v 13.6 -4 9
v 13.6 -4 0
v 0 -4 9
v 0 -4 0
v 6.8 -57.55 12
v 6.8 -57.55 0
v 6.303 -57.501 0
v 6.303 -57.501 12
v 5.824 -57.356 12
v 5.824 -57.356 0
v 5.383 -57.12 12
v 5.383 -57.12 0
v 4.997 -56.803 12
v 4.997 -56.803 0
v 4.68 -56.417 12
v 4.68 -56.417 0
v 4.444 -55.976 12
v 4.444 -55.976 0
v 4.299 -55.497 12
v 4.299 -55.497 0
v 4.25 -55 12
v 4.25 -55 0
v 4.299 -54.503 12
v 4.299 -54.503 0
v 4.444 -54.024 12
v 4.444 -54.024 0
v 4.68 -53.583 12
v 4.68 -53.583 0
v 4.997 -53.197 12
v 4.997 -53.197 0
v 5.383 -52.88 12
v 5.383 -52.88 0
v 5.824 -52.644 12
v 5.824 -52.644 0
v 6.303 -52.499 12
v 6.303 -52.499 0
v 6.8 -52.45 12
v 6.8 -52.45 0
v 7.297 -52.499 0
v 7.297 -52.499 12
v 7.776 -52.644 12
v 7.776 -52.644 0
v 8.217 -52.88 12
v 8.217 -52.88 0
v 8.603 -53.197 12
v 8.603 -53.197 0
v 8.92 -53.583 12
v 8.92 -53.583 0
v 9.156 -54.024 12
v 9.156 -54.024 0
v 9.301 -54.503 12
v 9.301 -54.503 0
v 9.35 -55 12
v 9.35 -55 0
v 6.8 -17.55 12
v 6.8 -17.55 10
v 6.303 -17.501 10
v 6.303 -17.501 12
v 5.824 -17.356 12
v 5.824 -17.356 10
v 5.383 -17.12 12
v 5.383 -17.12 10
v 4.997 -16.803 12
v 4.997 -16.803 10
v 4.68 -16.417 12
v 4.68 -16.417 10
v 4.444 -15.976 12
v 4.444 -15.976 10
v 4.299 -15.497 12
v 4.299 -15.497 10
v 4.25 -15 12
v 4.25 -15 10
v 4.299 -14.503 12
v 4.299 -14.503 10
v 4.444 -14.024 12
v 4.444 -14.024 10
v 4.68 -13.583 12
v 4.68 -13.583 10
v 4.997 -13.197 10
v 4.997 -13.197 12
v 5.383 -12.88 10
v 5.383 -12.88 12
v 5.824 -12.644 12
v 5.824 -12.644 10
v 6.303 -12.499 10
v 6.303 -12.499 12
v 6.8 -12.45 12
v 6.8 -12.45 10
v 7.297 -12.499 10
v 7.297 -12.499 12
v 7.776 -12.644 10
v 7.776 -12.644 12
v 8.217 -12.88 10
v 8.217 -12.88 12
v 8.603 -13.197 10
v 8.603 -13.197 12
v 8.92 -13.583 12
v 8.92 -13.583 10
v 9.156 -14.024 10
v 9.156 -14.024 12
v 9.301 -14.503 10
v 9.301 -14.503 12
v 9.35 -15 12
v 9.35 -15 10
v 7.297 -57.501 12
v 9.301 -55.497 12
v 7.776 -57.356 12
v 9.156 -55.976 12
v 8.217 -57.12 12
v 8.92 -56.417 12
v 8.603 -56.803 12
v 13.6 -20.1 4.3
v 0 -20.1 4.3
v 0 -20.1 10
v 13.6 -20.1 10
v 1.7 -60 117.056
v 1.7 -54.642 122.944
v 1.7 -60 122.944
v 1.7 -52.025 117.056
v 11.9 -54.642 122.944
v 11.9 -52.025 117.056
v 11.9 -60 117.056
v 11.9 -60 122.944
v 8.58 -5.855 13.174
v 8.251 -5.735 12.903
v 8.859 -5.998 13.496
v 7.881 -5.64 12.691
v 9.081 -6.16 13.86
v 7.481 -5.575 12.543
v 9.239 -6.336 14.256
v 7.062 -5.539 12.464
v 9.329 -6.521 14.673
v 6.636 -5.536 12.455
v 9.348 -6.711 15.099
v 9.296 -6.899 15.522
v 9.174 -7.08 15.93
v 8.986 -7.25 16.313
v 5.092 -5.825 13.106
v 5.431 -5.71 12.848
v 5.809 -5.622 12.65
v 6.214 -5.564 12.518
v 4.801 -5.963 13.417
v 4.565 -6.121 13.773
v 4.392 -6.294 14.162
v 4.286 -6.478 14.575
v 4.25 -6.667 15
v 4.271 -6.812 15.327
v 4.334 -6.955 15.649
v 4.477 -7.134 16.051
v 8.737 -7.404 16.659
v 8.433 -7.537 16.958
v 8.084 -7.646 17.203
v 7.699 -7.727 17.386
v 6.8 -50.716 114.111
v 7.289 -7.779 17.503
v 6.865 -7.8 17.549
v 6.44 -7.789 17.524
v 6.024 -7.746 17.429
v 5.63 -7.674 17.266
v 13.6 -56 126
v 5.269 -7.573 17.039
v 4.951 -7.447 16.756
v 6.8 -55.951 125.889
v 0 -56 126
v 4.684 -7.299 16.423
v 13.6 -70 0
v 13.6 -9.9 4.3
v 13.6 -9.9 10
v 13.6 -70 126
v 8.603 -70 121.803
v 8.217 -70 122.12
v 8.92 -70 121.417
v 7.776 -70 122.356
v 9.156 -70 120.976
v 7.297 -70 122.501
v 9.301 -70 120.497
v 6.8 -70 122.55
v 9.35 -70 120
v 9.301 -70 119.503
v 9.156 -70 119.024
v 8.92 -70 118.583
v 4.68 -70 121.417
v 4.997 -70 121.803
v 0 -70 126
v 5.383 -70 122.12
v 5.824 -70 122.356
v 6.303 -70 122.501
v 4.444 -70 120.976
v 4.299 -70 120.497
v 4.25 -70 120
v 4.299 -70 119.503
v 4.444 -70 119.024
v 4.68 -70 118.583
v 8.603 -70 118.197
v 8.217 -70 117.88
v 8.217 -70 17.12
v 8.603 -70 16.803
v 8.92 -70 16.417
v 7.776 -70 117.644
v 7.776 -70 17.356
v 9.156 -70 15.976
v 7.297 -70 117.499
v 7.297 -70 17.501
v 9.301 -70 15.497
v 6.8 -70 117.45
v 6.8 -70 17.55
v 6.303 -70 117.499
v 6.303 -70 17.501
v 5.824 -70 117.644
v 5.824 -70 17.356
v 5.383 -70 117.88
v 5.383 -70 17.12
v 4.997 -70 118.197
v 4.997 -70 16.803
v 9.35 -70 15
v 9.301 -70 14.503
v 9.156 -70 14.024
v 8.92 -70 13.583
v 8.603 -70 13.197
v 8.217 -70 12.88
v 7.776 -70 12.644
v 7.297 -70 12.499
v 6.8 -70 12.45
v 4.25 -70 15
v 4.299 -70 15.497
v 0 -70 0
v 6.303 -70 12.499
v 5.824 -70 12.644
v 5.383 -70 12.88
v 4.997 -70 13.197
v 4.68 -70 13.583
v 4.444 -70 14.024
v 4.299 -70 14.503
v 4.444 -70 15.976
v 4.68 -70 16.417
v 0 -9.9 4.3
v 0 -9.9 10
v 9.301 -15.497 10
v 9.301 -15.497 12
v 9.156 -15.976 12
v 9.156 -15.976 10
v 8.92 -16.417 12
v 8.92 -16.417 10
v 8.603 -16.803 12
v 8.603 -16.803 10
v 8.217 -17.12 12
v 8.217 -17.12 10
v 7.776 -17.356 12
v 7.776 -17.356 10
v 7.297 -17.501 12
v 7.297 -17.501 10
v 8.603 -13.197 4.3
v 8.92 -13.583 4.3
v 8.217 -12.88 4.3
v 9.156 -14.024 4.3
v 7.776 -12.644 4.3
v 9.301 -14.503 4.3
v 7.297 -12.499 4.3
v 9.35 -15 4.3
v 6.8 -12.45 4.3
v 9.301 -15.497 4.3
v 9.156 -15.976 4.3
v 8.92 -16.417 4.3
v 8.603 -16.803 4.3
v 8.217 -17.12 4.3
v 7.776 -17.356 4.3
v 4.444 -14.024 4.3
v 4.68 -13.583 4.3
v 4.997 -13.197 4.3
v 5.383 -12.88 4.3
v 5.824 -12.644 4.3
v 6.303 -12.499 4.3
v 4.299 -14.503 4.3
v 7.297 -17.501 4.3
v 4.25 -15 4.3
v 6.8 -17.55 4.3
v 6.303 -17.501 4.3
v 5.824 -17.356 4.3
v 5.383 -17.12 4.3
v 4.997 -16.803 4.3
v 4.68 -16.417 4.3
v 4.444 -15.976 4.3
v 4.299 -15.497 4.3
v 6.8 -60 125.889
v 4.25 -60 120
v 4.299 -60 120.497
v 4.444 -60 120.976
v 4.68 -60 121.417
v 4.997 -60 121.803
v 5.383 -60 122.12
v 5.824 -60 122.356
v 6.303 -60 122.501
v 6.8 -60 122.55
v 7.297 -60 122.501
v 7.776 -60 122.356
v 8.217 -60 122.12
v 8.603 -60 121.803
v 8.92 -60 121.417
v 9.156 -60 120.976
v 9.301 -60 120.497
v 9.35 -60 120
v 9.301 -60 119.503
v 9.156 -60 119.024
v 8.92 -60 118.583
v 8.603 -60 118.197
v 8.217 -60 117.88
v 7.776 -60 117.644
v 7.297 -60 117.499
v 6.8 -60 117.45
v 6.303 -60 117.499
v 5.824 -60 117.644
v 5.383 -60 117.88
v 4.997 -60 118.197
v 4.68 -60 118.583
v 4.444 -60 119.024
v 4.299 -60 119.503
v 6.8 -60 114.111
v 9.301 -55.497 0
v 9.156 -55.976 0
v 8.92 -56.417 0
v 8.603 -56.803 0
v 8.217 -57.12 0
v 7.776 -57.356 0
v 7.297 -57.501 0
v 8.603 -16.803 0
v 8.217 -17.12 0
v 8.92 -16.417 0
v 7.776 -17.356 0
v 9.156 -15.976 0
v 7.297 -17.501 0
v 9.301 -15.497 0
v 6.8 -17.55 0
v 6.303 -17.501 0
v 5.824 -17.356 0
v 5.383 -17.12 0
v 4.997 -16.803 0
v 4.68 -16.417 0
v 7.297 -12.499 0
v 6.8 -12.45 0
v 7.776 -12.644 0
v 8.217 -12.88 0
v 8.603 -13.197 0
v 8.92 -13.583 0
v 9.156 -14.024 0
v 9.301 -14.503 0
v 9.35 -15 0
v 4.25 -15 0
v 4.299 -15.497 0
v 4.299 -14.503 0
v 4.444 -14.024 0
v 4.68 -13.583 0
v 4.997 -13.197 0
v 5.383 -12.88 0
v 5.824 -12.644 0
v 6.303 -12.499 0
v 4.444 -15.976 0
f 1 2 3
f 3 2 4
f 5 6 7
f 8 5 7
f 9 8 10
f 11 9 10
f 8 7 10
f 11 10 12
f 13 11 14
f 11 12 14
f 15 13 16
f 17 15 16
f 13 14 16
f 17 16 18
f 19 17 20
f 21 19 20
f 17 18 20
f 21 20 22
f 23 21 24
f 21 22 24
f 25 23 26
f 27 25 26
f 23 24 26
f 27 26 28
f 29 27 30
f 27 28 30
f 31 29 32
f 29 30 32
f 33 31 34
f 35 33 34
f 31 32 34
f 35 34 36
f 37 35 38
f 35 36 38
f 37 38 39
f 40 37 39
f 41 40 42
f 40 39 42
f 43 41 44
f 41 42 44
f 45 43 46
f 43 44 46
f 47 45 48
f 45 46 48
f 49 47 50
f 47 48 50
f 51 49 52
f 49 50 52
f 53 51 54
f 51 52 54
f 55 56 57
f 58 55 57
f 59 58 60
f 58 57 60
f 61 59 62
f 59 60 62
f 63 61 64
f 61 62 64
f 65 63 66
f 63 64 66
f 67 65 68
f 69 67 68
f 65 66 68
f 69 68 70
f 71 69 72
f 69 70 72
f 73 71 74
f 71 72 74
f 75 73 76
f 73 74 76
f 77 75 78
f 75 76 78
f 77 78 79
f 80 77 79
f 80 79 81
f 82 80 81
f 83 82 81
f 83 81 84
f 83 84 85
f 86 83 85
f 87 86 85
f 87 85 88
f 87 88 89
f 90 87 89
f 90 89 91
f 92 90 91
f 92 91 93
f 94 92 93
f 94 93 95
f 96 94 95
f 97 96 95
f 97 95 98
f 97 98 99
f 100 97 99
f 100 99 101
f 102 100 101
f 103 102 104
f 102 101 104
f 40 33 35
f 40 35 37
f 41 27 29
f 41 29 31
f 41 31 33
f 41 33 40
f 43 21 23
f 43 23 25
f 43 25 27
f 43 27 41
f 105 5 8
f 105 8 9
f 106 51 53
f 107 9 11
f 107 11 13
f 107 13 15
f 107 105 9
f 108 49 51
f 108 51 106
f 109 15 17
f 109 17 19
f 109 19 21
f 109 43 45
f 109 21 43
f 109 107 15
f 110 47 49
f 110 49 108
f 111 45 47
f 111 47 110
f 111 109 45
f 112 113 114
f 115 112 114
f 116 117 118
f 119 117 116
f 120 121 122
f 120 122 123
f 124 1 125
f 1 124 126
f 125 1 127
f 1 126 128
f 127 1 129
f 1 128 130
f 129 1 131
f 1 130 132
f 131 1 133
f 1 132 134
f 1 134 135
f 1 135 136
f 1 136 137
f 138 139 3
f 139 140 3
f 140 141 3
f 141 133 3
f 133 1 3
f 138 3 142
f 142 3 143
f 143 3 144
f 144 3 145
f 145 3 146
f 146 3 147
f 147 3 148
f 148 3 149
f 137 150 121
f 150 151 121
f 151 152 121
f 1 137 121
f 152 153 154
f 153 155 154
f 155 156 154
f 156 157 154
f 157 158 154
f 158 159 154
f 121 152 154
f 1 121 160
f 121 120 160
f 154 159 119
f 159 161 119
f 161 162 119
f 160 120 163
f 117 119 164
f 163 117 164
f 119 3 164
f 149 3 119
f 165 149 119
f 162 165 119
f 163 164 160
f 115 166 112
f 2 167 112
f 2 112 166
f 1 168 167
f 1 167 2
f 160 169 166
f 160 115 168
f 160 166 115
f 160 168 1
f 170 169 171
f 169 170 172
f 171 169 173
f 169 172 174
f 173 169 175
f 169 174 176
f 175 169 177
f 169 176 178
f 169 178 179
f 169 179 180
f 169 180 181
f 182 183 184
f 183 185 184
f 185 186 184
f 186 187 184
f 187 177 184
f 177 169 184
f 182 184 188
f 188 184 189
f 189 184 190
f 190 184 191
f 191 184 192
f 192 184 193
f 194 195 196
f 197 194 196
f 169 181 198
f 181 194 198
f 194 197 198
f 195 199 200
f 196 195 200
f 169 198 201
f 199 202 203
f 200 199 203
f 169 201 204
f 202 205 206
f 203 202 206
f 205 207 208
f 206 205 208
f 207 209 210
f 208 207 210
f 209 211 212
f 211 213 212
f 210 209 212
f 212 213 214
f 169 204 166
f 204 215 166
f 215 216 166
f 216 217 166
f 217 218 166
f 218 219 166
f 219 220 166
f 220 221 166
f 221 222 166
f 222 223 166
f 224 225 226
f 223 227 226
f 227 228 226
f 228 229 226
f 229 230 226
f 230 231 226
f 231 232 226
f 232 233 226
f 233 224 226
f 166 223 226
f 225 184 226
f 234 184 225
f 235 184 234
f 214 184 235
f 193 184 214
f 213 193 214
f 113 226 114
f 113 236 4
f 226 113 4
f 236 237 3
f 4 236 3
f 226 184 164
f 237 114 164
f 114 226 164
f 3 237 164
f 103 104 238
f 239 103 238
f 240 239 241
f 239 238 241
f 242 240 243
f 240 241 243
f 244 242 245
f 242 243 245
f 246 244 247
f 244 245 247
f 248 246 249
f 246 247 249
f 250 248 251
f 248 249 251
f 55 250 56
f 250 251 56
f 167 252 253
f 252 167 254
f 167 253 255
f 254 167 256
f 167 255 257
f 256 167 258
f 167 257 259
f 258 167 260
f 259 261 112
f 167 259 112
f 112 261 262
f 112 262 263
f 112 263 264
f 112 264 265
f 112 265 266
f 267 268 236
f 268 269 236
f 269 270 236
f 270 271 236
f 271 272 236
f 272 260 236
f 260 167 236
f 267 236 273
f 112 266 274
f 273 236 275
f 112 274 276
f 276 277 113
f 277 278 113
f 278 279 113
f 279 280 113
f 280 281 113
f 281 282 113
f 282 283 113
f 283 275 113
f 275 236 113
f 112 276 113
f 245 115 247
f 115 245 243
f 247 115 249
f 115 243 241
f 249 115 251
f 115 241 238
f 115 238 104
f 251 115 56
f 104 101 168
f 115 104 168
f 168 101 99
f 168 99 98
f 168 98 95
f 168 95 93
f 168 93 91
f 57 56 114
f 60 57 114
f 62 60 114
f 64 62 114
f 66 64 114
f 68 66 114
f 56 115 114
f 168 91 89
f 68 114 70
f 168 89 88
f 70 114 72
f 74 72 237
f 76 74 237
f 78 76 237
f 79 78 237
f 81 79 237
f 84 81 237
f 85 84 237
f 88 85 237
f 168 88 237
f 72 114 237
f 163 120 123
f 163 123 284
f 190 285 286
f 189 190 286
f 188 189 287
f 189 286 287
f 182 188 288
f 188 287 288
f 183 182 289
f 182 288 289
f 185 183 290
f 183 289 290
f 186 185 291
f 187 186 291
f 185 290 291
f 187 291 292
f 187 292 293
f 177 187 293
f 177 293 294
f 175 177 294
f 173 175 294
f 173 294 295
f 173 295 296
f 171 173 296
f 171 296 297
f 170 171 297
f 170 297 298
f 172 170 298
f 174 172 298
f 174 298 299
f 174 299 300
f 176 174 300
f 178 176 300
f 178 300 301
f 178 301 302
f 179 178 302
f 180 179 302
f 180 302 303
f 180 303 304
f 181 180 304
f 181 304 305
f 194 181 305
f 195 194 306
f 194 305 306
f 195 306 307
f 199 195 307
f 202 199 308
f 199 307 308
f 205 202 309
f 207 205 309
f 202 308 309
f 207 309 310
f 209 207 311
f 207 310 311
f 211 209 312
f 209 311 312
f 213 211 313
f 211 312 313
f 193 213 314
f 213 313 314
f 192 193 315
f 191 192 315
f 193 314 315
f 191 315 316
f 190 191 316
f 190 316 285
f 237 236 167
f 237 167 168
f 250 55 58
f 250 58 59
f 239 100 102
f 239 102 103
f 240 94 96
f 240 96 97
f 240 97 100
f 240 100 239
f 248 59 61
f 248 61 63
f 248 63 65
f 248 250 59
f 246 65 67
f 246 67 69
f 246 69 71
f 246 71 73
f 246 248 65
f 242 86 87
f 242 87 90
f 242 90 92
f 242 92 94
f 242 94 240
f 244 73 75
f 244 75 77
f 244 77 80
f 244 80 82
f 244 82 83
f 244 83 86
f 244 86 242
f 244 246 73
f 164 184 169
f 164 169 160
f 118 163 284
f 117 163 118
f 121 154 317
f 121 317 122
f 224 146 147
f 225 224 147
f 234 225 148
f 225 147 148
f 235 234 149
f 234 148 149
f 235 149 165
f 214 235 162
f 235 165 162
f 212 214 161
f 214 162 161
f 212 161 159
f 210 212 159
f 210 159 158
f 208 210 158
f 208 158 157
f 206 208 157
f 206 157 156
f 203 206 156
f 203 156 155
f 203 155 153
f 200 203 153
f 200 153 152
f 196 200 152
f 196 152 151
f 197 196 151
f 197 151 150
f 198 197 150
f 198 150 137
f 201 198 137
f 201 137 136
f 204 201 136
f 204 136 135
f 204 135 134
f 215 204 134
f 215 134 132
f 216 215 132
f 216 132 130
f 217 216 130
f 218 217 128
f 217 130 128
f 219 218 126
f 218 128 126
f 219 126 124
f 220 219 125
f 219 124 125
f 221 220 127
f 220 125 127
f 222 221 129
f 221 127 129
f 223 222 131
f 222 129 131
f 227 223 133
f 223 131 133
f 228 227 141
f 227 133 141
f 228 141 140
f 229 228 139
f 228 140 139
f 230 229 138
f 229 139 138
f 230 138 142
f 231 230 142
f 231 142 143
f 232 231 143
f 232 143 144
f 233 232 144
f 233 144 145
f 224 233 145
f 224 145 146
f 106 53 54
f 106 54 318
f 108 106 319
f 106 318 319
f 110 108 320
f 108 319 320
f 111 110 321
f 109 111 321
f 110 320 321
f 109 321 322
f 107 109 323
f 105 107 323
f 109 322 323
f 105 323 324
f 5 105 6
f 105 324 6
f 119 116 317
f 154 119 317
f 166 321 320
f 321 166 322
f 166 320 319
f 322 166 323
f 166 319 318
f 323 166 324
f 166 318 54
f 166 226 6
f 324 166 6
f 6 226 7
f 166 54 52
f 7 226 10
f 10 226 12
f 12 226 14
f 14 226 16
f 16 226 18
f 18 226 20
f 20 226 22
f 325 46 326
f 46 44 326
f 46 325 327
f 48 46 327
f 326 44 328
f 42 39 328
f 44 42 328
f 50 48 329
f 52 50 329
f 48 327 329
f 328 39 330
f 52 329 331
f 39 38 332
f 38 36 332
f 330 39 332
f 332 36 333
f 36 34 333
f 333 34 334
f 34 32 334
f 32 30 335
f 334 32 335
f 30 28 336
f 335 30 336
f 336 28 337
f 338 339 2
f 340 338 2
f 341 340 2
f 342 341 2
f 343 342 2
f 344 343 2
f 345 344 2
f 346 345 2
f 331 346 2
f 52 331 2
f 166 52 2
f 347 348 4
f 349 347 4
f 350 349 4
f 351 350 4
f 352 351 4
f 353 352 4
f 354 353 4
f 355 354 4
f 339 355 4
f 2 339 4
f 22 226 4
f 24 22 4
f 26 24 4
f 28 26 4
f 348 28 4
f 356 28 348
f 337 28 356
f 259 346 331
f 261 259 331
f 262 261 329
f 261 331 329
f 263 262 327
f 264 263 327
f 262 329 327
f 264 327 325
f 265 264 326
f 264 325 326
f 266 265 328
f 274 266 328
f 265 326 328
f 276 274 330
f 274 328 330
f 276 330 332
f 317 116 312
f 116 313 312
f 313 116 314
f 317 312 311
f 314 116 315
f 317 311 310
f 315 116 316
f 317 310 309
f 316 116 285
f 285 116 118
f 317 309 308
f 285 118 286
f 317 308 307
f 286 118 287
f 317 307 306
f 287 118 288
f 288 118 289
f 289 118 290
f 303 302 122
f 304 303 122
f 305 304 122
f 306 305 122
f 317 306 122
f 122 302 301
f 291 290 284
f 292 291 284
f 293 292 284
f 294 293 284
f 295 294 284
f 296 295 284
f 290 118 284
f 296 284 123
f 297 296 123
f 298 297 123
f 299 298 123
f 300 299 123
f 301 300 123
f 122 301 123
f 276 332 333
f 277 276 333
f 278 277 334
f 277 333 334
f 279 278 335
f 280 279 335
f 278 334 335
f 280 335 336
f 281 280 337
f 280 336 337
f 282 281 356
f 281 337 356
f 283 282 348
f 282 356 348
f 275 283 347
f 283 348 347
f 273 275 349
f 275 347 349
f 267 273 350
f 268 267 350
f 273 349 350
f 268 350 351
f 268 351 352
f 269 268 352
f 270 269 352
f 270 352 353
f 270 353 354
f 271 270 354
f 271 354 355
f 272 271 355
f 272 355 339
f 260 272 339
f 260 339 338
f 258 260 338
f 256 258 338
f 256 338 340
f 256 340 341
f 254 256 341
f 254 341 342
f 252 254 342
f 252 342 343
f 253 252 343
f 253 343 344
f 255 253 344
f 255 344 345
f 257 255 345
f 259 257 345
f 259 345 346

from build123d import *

# Parameters (mm, degrees)
F1_DEPTH  = 13.6
F3_D      = 5.1
F5_DEPTH  = 12
F6_DEPTH  = 25
F7_DEPTH  = 15
F8_D      = 5.1
F9_W      = 5.1
F9_H      = 5.7
F10_DEPTH = 25
F4_W      = 6.8
F4_H      = 4
F11_DEPTH = 25
F12_DEPTH = 25


# Not quite as in the source:
# - a feature names something its author has since deleted; it is built from what else it names


with BuildPart() as f1:
    # F0 (on Right) → F1 (new body)
    with BuildSketch(Plane.YZ):
        Polygon((-70, 0), (0, 0), (-56, 126), (-70, 126), align=None)
        Polygon((-70, 126), (-56, 126), (-60, 135), (-70, 135), align=None)
    extrude(amount=F1_DEPTH)

    # F3 (through all)
    with Locations(Plane.XZ.offset(70)):
        with Locations((6.8, 15), (6.8, 120)):
            Hole(F3_D / 2)

    # F4 (on face) → F5 (cut)
    with BuildSketch(Plane(origin=(0, 0, 0), x_dir=(1, 0, 0), z_dir=(0, 0, -1))):
        with BuildLine():
            ThreePointArc((9.35, 55), (8.603122292, 56.803122292), (6.8, 57.55))
            Line((6.8, 57.55), (6.8, 55))
            Line((6.8, 55), (6.8, 52.45))
            ThreePointArc((6.8, 52.45), (8.603122292, 53.196877708), (9.35, 55))
        make_face()
        with BuildLine():
            ThreePointArc((9.35, 15), (8.603122292, 16.803122292), (6.8, 17.55))
            ThreePointArc((6.8, 17.55), (4.996877708, 13.196877708), (9.35, 15))
        make_face()
        with BuildLine():
            Line((6.8, 55), (6.8, 57.55))
            ThreePointArc((6.8, 57.55), (4.25, 55), (6.8, 52.45))
            Line((6.8, 52.45), (6.8, 55))
        make_face()
    extrude(amount=-F5_DEPTH, mode=Mode.SUBTRACT)

    # F2 (on face) → F6 (join)
    with BuildSketch(Plane.XZ.offset(70)):
        Polygon((11.9, 122.9444863729), (6.8, 125.8889727457), (1.7, 122.9444863729), (1.7, 117.0555136271), (6.8, 114.1110272543), (11.9, 117.0555136271), align=None)
    extrude(amount=-F6_DEPTH)

    # F7 (cut): a face of the model
    f7_faces = [f1.faces().sort_by_distance(p)[0] for p in [
        (6.8, -45, 120),
    ]]
    extrude(f7_faces, amount=-F7_DEPTH, mode=Mode.SUBTRACT)

    # F8 (through all)
    with Locations(Plane.XZ.offset(70)):
        with Locations((6.8, 120)):
            Hole(F8_D / 2)

    # F9 (on face) → F10 (cut)
    with BuildSketch(Plane(origin=(0, 0, 0), x_dir=(0, -1, 0), z_dir=(-1, 0, 0))):
        with Locations((12.45, 7.15)):
            Rectangle(F9_W, F9_H)
        with Locations((17.55, 7.15)):
            Rectangle(F9_W, F9_H)
    extrude(amount=-F10_DEPTH, mode=Mode.SUBTRACT)

    # F4 (on face) → F11 (cut)
    with BuildSketch(Plane(origin=(0, 0, 0), x_dir=(1, 0, 0), z_dir=(0, 0, -1))):
        with Locations((10.2, 2)):
            Rectangle(F4_W, F4_H)
        with Locations((3.4, 2)):
            Rectangle(F4_W, F4_H)
    extrude(amount=-F11_DEPTH, mode=Mode.SUBTRACT)

    # F0 (on Right) → F12 (cut)
    with BuildSketch(Plane.YZ):
        Polygon((-70, 126), (-56, 126), (-60, 135), (-70, 135), align=None)
    extrude(amount=F12_DEPTH, mode=Mode.SUBTRACT)


solid = f1.part
